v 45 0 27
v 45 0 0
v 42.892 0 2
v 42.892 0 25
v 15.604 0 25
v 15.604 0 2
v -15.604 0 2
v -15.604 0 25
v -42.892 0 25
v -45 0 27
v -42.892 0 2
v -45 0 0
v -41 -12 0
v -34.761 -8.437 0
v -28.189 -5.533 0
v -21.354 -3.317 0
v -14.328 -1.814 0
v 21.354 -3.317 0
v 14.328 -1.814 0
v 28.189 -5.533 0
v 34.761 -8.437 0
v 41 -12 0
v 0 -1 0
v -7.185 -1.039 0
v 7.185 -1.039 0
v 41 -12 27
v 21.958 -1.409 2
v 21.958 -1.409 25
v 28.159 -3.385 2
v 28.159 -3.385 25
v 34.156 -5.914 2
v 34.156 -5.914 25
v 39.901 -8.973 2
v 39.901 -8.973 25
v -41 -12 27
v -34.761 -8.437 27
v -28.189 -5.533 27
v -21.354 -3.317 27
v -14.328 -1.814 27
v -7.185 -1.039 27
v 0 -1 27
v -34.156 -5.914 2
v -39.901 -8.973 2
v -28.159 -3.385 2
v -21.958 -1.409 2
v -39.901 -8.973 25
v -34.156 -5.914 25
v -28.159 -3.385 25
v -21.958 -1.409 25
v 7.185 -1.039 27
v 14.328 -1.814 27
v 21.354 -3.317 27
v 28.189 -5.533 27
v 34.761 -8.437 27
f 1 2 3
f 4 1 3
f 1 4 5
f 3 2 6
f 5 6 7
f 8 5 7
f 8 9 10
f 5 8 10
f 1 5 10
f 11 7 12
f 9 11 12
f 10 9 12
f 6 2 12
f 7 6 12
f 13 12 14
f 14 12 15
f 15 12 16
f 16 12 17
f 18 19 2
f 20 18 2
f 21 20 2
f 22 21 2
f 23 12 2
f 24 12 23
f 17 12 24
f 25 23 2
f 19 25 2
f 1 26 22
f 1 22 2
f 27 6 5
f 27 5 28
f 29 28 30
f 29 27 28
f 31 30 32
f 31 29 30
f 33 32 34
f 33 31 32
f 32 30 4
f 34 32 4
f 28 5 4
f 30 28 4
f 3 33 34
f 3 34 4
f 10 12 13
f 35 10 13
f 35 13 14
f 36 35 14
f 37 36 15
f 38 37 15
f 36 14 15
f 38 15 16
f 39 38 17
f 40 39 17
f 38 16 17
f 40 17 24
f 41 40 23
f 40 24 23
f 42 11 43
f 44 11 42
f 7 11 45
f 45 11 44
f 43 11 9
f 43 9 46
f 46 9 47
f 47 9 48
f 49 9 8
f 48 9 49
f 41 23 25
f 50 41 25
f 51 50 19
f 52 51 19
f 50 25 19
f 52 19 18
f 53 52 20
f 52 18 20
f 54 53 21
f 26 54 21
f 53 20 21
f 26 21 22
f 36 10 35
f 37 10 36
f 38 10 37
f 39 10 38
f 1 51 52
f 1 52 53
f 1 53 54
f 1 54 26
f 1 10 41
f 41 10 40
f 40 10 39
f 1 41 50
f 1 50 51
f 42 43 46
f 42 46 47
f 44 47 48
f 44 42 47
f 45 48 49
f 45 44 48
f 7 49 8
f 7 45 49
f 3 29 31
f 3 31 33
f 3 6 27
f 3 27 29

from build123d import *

# Parameters (mm, degrees)
BOSS_EXTRUDE1_DEPTH = 27
SHELL1_START        = 2
SHELL1_DEPTH        = 23


# Read off the part's stored shape, not the designer's step: Shell1
with BuildPart() as part:
    # Sketch1 → Boss-Extrude1 (new body)
    with BuildSketch(Plane.XY):
        with BuildLine():
            Line((45, 0), (-45, 0))
            Line((-45, 0), (-41, -12))
            ThreePointArc((-41, -12), (-21.353939388, -3.317135008), (0, -1))
            ThreePointArc((0, -1), (21.353939388, -3.317135008), (41, -12))
            Line((41, -12), (45, 0))
        make_face()
    extrude(amount=BOSS_EXTRUDE1_DEPTH)

    # Shell1 outline → Shell1 (cut)
    with BuildSketch(Plane.XY.offset(SHELL1_START)):
        with BuildLine():
            Line((-42.891814893, 0), (-39.90071559, -8.97329791))
            ThreePointArc((-39.90071559, -8.97329791), (-28.159071544, -3.3851069), (-15.603788395, 0))
            Line((-15.603788395, 0), (-42.891814893, 0))
        make_face()
        with BuildLine():
            Line((42.891814893, 0), (15.603788395, 0))
            ThreePointArc((15.603788395, 0), (28.159071544, -3.3851069), (39.90071559, -8.97329791))
            Line((39.90071559, -8.97329791), (42.891814893, 0))
        make_face()
    extrude(amount=SHELL1_DEPTH, mode=Mode.SUBTRACT)


solid = part.part
